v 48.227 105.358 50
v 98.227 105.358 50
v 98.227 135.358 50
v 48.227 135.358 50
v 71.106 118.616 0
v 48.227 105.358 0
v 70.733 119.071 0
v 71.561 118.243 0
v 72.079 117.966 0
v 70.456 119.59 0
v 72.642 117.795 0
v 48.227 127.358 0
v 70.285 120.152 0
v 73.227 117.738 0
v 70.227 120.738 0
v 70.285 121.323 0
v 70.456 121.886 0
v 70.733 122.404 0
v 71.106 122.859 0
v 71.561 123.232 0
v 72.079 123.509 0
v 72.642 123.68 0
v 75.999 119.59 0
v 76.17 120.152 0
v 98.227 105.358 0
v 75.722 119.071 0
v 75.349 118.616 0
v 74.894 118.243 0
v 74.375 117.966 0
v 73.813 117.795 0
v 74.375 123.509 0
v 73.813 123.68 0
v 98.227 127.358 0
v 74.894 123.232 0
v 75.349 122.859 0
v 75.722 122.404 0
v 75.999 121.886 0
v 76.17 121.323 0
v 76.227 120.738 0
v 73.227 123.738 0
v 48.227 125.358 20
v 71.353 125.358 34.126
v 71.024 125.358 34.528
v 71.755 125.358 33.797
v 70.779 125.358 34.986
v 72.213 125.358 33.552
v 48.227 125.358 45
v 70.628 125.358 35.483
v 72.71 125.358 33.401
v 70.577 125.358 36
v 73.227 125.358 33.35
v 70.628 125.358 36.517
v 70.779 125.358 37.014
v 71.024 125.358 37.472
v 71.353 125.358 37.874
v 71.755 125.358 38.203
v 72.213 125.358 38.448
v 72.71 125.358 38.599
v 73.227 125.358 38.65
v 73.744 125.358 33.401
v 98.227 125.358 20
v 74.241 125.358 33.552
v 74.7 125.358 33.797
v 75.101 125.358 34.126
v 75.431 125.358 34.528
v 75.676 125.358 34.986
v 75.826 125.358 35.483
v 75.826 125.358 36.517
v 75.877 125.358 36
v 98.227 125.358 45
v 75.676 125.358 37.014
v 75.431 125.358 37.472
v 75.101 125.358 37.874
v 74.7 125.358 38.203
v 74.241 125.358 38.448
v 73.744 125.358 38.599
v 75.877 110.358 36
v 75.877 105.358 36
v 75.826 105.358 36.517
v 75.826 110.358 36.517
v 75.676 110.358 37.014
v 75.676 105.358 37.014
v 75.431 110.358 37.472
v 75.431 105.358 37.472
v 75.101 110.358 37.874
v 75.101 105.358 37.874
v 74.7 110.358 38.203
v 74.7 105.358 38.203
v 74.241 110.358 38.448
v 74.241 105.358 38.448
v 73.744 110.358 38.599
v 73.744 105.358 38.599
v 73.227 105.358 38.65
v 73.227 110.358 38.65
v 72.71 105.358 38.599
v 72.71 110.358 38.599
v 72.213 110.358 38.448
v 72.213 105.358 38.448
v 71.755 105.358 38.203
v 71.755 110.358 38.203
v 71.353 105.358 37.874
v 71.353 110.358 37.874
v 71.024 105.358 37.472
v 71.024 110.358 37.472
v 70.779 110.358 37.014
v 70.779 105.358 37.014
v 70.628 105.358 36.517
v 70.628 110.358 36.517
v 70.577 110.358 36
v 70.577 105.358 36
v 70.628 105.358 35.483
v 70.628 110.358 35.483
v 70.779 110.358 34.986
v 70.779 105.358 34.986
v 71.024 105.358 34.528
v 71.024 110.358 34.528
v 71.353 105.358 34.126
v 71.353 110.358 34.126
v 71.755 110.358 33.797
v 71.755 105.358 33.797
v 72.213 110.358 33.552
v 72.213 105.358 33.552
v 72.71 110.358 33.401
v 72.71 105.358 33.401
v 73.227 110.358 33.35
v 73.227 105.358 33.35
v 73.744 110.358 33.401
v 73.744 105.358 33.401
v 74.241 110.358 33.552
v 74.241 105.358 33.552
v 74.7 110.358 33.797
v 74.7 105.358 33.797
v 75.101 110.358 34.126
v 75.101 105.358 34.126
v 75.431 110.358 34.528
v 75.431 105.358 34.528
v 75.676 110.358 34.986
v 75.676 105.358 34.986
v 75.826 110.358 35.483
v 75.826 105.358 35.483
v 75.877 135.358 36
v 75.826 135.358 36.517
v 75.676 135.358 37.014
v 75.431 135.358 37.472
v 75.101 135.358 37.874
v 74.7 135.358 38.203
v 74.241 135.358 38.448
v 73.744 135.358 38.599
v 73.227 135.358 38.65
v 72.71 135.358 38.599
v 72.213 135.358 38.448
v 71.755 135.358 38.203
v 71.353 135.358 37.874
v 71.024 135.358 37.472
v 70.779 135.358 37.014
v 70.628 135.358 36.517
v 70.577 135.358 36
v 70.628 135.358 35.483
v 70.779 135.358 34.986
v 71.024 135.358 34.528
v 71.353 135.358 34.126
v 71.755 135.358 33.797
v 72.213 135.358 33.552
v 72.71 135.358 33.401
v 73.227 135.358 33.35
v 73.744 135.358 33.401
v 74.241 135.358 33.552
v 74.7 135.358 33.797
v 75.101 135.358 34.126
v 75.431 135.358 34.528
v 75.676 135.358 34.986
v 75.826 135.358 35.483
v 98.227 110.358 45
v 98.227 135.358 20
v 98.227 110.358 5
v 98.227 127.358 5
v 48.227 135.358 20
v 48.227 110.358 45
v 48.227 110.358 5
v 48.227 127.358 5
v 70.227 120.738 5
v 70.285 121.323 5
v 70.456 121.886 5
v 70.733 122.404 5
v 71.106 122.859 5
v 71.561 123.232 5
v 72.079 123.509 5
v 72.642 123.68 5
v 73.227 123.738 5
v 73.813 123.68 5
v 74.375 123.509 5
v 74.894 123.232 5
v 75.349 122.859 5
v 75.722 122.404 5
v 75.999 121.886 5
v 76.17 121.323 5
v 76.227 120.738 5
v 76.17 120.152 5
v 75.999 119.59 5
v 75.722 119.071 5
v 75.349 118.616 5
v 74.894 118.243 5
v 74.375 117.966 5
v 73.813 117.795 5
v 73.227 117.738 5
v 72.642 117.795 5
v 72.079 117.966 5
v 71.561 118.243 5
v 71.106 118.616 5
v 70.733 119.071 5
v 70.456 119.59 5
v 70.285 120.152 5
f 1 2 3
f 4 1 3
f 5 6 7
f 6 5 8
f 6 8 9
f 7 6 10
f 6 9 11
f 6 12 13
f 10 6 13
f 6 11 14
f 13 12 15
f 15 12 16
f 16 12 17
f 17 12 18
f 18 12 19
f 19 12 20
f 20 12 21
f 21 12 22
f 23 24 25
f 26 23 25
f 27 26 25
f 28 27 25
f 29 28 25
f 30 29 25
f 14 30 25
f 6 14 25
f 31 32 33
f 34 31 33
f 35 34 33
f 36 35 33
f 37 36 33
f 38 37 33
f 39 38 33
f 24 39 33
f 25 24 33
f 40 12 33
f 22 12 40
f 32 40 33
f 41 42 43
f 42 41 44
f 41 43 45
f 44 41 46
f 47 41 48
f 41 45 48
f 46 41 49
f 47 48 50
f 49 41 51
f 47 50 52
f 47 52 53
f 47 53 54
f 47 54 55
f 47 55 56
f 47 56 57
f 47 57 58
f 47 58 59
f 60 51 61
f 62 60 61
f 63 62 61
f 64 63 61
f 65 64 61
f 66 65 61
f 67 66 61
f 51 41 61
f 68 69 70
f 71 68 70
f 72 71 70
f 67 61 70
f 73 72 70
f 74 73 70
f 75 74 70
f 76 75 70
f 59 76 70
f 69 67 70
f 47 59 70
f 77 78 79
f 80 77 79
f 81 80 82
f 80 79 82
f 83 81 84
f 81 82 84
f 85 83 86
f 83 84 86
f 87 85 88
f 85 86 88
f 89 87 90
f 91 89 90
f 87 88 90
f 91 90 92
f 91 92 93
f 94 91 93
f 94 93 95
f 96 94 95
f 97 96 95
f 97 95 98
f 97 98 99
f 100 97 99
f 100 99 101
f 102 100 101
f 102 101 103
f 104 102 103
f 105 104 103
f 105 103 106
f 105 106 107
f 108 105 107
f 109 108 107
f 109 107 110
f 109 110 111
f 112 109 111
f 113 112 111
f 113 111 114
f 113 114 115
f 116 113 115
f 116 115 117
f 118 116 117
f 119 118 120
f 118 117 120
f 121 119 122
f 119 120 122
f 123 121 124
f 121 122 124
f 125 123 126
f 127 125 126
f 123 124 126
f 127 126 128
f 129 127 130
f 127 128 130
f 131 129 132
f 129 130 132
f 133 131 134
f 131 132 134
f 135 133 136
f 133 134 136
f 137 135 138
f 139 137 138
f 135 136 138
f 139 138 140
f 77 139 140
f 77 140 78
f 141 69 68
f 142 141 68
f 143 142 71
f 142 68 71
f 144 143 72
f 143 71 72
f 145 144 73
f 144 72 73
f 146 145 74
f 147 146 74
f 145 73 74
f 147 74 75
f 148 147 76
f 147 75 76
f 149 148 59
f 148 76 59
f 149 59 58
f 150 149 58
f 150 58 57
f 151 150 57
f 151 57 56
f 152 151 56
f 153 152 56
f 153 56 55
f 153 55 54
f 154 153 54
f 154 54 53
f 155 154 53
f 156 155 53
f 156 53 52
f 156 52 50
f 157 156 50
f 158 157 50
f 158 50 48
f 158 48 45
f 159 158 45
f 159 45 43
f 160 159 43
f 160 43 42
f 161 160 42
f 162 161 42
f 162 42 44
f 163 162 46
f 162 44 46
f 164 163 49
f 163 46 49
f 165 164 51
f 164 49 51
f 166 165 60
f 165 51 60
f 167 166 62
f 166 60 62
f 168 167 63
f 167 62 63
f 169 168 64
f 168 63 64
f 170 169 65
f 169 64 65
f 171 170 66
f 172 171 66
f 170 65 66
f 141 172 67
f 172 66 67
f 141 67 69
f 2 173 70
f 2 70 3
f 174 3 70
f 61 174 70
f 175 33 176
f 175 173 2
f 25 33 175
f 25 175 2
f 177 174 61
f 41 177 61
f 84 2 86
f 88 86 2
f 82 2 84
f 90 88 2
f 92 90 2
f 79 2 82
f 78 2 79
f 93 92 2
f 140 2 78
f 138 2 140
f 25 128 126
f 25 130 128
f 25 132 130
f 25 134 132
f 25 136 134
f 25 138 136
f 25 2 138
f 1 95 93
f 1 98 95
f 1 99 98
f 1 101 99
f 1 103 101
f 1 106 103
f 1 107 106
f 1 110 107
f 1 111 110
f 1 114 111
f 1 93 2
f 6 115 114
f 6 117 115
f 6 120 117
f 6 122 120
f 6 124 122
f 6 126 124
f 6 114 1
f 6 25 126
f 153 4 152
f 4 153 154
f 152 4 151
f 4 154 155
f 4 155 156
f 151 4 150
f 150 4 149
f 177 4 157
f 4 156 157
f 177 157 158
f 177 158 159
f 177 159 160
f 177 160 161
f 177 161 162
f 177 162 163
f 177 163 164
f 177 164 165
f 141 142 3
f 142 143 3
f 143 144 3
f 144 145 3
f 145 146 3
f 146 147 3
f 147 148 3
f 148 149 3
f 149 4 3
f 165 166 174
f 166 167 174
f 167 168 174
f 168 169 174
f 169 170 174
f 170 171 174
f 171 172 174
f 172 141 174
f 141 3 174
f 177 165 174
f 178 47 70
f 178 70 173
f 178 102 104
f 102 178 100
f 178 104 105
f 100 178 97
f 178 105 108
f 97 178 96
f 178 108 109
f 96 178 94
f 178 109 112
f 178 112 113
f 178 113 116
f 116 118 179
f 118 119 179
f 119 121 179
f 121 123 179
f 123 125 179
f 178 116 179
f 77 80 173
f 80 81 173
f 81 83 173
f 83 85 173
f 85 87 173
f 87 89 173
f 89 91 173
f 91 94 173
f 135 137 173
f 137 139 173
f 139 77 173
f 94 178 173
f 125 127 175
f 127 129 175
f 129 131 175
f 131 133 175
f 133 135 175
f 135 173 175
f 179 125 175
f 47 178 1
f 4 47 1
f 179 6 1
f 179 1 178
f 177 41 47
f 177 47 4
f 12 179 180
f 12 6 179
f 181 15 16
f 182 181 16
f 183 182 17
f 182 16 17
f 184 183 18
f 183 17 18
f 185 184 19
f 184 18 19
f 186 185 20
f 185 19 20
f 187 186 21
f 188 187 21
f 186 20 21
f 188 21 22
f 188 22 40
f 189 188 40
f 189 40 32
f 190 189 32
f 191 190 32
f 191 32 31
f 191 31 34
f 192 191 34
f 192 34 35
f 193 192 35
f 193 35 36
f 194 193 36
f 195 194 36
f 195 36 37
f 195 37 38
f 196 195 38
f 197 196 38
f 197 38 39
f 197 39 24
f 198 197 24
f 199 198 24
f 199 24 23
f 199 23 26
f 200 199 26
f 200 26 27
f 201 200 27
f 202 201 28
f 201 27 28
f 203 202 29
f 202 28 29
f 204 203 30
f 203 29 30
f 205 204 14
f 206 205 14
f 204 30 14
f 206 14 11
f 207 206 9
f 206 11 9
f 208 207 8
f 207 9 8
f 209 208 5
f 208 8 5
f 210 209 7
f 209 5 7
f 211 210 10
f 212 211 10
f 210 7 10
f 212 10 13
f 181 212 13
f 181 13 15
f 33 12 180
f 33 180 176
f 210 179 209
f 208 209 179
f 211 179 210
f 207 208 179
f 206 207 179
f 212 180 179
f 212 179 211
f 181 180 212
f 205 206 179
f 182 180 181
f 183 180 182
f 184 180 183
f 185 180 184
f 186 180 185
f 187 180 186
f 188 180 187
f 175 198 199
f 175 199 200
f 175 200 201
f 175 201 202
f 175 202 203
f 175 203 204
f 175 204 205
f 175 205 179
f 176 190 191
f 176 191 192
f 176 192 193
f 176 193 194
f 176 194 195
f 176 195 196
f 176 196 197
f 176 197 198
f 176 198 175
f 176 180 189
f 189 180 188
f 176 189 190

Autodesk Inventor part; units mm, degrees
ref_plane "YZ Plane" through (0, 0, 0) normal (1, 0, 0) x (0, 1, 0)
ref_plane "XZ Plane" through (0, 0, 0) normal (0, 1, 0) x (-1, 0, 0)
ref_plane "XY Plane" through (0, 0, 0) normal (0, 0, 1) x (1, 0, 0)
sketch "Sketch1" plane through (0, 0, 0) normal (0, 0, 1) x (1, 0, 0)
  line L0 (48.2273, 127.3576) -> (98.2273, 127.3576)
  line L1 (98.2273, 127.3576) -> (98.2273, 105.3576)
  line L2 (98.2273, 105.3576) -> (48.2273, 105.3576)
  line L3 (48.2273, 105.3576) -> (48.2273, 127.3576)
  point P0 (0, 0)
  dimension "d8" = 50
  dimension "d9" = 22
extrude "Extrusion1" add sketch "Sketch1" along normal blind 5
sketch "Sketch2" plane through (98.2273, 105.3576, 0) normal (1, 0, 0) x (0, 0, -1)
  line L0 (-5, 0) -> (-50, 0)
  line L1 (-50, 0) -> (-50, 30)
  line L2 (-50, 30) -> (-20, 30)
  line L3 (-20, 30) -> (-20, 20)
  line L4 (-20, 20) -> (-45, 20)
  line L5 (-45, 20) -> (-45, 5)
  line L6 (-45, 5) -> (-5, 5)
  line L7 (-5, 0) -> (-5, 22) projected
  line L8 (-5, 5) -> (-5, 0)
  point P0 (0, -105.3576)
  dimension "d12" = 45
  dimension "d13" = 30
  dimension "d14" = 30
  dimension "d15" = 10
  dimension "d16" = 25
  dimension "d17" = 15
  dimension "d18" = 40
  dimension "d19" = 5
extrude "Extrusion2" add sketch "Sketch2" against normal blind 50
sketch "Sketch4" plane through (48.2273, 105.3576, 0) normal (0, -1, 0) x (1, 0, 0)
  line L0 (50, 50) -> (0, 50) projected
  circle A0 centre (25, 36) radius 2.65
  point P0 (-48.2273, 0)
  dimension "d24" = 5.3
extrude "Extrusion3" cut sketch "Sketch4" against normal blind 50
thread "Thread1" size "M5.5x0.5" class "6H" standard "ANSI Metric M Profile" length 43.6
thread "Thread2" size "M5.5x0.5" class "6H" standard "ANSI Metric M Profile" length 43.6
sketch "Sketch5" plane through (0, 0, 0) normal (0, 0, -1) x (-1, 0, 0)
  line L0 (-98.2273, 127.3576) -> (-48.2273, 127.3576) projected
  circle A0 centre (-73.2273, 120.7376) radius 3
  point P0 (0, 0)
  dimension "d32" = 6
extrude "Extrusion4" cut sketch "Sketch5" against normal blind 20
thread "Thread3" size "M6x1" class "6H" standard "ANSI Metric M Profile" length 43.6
properties part number "Chasis Depan Roda Kiri"
